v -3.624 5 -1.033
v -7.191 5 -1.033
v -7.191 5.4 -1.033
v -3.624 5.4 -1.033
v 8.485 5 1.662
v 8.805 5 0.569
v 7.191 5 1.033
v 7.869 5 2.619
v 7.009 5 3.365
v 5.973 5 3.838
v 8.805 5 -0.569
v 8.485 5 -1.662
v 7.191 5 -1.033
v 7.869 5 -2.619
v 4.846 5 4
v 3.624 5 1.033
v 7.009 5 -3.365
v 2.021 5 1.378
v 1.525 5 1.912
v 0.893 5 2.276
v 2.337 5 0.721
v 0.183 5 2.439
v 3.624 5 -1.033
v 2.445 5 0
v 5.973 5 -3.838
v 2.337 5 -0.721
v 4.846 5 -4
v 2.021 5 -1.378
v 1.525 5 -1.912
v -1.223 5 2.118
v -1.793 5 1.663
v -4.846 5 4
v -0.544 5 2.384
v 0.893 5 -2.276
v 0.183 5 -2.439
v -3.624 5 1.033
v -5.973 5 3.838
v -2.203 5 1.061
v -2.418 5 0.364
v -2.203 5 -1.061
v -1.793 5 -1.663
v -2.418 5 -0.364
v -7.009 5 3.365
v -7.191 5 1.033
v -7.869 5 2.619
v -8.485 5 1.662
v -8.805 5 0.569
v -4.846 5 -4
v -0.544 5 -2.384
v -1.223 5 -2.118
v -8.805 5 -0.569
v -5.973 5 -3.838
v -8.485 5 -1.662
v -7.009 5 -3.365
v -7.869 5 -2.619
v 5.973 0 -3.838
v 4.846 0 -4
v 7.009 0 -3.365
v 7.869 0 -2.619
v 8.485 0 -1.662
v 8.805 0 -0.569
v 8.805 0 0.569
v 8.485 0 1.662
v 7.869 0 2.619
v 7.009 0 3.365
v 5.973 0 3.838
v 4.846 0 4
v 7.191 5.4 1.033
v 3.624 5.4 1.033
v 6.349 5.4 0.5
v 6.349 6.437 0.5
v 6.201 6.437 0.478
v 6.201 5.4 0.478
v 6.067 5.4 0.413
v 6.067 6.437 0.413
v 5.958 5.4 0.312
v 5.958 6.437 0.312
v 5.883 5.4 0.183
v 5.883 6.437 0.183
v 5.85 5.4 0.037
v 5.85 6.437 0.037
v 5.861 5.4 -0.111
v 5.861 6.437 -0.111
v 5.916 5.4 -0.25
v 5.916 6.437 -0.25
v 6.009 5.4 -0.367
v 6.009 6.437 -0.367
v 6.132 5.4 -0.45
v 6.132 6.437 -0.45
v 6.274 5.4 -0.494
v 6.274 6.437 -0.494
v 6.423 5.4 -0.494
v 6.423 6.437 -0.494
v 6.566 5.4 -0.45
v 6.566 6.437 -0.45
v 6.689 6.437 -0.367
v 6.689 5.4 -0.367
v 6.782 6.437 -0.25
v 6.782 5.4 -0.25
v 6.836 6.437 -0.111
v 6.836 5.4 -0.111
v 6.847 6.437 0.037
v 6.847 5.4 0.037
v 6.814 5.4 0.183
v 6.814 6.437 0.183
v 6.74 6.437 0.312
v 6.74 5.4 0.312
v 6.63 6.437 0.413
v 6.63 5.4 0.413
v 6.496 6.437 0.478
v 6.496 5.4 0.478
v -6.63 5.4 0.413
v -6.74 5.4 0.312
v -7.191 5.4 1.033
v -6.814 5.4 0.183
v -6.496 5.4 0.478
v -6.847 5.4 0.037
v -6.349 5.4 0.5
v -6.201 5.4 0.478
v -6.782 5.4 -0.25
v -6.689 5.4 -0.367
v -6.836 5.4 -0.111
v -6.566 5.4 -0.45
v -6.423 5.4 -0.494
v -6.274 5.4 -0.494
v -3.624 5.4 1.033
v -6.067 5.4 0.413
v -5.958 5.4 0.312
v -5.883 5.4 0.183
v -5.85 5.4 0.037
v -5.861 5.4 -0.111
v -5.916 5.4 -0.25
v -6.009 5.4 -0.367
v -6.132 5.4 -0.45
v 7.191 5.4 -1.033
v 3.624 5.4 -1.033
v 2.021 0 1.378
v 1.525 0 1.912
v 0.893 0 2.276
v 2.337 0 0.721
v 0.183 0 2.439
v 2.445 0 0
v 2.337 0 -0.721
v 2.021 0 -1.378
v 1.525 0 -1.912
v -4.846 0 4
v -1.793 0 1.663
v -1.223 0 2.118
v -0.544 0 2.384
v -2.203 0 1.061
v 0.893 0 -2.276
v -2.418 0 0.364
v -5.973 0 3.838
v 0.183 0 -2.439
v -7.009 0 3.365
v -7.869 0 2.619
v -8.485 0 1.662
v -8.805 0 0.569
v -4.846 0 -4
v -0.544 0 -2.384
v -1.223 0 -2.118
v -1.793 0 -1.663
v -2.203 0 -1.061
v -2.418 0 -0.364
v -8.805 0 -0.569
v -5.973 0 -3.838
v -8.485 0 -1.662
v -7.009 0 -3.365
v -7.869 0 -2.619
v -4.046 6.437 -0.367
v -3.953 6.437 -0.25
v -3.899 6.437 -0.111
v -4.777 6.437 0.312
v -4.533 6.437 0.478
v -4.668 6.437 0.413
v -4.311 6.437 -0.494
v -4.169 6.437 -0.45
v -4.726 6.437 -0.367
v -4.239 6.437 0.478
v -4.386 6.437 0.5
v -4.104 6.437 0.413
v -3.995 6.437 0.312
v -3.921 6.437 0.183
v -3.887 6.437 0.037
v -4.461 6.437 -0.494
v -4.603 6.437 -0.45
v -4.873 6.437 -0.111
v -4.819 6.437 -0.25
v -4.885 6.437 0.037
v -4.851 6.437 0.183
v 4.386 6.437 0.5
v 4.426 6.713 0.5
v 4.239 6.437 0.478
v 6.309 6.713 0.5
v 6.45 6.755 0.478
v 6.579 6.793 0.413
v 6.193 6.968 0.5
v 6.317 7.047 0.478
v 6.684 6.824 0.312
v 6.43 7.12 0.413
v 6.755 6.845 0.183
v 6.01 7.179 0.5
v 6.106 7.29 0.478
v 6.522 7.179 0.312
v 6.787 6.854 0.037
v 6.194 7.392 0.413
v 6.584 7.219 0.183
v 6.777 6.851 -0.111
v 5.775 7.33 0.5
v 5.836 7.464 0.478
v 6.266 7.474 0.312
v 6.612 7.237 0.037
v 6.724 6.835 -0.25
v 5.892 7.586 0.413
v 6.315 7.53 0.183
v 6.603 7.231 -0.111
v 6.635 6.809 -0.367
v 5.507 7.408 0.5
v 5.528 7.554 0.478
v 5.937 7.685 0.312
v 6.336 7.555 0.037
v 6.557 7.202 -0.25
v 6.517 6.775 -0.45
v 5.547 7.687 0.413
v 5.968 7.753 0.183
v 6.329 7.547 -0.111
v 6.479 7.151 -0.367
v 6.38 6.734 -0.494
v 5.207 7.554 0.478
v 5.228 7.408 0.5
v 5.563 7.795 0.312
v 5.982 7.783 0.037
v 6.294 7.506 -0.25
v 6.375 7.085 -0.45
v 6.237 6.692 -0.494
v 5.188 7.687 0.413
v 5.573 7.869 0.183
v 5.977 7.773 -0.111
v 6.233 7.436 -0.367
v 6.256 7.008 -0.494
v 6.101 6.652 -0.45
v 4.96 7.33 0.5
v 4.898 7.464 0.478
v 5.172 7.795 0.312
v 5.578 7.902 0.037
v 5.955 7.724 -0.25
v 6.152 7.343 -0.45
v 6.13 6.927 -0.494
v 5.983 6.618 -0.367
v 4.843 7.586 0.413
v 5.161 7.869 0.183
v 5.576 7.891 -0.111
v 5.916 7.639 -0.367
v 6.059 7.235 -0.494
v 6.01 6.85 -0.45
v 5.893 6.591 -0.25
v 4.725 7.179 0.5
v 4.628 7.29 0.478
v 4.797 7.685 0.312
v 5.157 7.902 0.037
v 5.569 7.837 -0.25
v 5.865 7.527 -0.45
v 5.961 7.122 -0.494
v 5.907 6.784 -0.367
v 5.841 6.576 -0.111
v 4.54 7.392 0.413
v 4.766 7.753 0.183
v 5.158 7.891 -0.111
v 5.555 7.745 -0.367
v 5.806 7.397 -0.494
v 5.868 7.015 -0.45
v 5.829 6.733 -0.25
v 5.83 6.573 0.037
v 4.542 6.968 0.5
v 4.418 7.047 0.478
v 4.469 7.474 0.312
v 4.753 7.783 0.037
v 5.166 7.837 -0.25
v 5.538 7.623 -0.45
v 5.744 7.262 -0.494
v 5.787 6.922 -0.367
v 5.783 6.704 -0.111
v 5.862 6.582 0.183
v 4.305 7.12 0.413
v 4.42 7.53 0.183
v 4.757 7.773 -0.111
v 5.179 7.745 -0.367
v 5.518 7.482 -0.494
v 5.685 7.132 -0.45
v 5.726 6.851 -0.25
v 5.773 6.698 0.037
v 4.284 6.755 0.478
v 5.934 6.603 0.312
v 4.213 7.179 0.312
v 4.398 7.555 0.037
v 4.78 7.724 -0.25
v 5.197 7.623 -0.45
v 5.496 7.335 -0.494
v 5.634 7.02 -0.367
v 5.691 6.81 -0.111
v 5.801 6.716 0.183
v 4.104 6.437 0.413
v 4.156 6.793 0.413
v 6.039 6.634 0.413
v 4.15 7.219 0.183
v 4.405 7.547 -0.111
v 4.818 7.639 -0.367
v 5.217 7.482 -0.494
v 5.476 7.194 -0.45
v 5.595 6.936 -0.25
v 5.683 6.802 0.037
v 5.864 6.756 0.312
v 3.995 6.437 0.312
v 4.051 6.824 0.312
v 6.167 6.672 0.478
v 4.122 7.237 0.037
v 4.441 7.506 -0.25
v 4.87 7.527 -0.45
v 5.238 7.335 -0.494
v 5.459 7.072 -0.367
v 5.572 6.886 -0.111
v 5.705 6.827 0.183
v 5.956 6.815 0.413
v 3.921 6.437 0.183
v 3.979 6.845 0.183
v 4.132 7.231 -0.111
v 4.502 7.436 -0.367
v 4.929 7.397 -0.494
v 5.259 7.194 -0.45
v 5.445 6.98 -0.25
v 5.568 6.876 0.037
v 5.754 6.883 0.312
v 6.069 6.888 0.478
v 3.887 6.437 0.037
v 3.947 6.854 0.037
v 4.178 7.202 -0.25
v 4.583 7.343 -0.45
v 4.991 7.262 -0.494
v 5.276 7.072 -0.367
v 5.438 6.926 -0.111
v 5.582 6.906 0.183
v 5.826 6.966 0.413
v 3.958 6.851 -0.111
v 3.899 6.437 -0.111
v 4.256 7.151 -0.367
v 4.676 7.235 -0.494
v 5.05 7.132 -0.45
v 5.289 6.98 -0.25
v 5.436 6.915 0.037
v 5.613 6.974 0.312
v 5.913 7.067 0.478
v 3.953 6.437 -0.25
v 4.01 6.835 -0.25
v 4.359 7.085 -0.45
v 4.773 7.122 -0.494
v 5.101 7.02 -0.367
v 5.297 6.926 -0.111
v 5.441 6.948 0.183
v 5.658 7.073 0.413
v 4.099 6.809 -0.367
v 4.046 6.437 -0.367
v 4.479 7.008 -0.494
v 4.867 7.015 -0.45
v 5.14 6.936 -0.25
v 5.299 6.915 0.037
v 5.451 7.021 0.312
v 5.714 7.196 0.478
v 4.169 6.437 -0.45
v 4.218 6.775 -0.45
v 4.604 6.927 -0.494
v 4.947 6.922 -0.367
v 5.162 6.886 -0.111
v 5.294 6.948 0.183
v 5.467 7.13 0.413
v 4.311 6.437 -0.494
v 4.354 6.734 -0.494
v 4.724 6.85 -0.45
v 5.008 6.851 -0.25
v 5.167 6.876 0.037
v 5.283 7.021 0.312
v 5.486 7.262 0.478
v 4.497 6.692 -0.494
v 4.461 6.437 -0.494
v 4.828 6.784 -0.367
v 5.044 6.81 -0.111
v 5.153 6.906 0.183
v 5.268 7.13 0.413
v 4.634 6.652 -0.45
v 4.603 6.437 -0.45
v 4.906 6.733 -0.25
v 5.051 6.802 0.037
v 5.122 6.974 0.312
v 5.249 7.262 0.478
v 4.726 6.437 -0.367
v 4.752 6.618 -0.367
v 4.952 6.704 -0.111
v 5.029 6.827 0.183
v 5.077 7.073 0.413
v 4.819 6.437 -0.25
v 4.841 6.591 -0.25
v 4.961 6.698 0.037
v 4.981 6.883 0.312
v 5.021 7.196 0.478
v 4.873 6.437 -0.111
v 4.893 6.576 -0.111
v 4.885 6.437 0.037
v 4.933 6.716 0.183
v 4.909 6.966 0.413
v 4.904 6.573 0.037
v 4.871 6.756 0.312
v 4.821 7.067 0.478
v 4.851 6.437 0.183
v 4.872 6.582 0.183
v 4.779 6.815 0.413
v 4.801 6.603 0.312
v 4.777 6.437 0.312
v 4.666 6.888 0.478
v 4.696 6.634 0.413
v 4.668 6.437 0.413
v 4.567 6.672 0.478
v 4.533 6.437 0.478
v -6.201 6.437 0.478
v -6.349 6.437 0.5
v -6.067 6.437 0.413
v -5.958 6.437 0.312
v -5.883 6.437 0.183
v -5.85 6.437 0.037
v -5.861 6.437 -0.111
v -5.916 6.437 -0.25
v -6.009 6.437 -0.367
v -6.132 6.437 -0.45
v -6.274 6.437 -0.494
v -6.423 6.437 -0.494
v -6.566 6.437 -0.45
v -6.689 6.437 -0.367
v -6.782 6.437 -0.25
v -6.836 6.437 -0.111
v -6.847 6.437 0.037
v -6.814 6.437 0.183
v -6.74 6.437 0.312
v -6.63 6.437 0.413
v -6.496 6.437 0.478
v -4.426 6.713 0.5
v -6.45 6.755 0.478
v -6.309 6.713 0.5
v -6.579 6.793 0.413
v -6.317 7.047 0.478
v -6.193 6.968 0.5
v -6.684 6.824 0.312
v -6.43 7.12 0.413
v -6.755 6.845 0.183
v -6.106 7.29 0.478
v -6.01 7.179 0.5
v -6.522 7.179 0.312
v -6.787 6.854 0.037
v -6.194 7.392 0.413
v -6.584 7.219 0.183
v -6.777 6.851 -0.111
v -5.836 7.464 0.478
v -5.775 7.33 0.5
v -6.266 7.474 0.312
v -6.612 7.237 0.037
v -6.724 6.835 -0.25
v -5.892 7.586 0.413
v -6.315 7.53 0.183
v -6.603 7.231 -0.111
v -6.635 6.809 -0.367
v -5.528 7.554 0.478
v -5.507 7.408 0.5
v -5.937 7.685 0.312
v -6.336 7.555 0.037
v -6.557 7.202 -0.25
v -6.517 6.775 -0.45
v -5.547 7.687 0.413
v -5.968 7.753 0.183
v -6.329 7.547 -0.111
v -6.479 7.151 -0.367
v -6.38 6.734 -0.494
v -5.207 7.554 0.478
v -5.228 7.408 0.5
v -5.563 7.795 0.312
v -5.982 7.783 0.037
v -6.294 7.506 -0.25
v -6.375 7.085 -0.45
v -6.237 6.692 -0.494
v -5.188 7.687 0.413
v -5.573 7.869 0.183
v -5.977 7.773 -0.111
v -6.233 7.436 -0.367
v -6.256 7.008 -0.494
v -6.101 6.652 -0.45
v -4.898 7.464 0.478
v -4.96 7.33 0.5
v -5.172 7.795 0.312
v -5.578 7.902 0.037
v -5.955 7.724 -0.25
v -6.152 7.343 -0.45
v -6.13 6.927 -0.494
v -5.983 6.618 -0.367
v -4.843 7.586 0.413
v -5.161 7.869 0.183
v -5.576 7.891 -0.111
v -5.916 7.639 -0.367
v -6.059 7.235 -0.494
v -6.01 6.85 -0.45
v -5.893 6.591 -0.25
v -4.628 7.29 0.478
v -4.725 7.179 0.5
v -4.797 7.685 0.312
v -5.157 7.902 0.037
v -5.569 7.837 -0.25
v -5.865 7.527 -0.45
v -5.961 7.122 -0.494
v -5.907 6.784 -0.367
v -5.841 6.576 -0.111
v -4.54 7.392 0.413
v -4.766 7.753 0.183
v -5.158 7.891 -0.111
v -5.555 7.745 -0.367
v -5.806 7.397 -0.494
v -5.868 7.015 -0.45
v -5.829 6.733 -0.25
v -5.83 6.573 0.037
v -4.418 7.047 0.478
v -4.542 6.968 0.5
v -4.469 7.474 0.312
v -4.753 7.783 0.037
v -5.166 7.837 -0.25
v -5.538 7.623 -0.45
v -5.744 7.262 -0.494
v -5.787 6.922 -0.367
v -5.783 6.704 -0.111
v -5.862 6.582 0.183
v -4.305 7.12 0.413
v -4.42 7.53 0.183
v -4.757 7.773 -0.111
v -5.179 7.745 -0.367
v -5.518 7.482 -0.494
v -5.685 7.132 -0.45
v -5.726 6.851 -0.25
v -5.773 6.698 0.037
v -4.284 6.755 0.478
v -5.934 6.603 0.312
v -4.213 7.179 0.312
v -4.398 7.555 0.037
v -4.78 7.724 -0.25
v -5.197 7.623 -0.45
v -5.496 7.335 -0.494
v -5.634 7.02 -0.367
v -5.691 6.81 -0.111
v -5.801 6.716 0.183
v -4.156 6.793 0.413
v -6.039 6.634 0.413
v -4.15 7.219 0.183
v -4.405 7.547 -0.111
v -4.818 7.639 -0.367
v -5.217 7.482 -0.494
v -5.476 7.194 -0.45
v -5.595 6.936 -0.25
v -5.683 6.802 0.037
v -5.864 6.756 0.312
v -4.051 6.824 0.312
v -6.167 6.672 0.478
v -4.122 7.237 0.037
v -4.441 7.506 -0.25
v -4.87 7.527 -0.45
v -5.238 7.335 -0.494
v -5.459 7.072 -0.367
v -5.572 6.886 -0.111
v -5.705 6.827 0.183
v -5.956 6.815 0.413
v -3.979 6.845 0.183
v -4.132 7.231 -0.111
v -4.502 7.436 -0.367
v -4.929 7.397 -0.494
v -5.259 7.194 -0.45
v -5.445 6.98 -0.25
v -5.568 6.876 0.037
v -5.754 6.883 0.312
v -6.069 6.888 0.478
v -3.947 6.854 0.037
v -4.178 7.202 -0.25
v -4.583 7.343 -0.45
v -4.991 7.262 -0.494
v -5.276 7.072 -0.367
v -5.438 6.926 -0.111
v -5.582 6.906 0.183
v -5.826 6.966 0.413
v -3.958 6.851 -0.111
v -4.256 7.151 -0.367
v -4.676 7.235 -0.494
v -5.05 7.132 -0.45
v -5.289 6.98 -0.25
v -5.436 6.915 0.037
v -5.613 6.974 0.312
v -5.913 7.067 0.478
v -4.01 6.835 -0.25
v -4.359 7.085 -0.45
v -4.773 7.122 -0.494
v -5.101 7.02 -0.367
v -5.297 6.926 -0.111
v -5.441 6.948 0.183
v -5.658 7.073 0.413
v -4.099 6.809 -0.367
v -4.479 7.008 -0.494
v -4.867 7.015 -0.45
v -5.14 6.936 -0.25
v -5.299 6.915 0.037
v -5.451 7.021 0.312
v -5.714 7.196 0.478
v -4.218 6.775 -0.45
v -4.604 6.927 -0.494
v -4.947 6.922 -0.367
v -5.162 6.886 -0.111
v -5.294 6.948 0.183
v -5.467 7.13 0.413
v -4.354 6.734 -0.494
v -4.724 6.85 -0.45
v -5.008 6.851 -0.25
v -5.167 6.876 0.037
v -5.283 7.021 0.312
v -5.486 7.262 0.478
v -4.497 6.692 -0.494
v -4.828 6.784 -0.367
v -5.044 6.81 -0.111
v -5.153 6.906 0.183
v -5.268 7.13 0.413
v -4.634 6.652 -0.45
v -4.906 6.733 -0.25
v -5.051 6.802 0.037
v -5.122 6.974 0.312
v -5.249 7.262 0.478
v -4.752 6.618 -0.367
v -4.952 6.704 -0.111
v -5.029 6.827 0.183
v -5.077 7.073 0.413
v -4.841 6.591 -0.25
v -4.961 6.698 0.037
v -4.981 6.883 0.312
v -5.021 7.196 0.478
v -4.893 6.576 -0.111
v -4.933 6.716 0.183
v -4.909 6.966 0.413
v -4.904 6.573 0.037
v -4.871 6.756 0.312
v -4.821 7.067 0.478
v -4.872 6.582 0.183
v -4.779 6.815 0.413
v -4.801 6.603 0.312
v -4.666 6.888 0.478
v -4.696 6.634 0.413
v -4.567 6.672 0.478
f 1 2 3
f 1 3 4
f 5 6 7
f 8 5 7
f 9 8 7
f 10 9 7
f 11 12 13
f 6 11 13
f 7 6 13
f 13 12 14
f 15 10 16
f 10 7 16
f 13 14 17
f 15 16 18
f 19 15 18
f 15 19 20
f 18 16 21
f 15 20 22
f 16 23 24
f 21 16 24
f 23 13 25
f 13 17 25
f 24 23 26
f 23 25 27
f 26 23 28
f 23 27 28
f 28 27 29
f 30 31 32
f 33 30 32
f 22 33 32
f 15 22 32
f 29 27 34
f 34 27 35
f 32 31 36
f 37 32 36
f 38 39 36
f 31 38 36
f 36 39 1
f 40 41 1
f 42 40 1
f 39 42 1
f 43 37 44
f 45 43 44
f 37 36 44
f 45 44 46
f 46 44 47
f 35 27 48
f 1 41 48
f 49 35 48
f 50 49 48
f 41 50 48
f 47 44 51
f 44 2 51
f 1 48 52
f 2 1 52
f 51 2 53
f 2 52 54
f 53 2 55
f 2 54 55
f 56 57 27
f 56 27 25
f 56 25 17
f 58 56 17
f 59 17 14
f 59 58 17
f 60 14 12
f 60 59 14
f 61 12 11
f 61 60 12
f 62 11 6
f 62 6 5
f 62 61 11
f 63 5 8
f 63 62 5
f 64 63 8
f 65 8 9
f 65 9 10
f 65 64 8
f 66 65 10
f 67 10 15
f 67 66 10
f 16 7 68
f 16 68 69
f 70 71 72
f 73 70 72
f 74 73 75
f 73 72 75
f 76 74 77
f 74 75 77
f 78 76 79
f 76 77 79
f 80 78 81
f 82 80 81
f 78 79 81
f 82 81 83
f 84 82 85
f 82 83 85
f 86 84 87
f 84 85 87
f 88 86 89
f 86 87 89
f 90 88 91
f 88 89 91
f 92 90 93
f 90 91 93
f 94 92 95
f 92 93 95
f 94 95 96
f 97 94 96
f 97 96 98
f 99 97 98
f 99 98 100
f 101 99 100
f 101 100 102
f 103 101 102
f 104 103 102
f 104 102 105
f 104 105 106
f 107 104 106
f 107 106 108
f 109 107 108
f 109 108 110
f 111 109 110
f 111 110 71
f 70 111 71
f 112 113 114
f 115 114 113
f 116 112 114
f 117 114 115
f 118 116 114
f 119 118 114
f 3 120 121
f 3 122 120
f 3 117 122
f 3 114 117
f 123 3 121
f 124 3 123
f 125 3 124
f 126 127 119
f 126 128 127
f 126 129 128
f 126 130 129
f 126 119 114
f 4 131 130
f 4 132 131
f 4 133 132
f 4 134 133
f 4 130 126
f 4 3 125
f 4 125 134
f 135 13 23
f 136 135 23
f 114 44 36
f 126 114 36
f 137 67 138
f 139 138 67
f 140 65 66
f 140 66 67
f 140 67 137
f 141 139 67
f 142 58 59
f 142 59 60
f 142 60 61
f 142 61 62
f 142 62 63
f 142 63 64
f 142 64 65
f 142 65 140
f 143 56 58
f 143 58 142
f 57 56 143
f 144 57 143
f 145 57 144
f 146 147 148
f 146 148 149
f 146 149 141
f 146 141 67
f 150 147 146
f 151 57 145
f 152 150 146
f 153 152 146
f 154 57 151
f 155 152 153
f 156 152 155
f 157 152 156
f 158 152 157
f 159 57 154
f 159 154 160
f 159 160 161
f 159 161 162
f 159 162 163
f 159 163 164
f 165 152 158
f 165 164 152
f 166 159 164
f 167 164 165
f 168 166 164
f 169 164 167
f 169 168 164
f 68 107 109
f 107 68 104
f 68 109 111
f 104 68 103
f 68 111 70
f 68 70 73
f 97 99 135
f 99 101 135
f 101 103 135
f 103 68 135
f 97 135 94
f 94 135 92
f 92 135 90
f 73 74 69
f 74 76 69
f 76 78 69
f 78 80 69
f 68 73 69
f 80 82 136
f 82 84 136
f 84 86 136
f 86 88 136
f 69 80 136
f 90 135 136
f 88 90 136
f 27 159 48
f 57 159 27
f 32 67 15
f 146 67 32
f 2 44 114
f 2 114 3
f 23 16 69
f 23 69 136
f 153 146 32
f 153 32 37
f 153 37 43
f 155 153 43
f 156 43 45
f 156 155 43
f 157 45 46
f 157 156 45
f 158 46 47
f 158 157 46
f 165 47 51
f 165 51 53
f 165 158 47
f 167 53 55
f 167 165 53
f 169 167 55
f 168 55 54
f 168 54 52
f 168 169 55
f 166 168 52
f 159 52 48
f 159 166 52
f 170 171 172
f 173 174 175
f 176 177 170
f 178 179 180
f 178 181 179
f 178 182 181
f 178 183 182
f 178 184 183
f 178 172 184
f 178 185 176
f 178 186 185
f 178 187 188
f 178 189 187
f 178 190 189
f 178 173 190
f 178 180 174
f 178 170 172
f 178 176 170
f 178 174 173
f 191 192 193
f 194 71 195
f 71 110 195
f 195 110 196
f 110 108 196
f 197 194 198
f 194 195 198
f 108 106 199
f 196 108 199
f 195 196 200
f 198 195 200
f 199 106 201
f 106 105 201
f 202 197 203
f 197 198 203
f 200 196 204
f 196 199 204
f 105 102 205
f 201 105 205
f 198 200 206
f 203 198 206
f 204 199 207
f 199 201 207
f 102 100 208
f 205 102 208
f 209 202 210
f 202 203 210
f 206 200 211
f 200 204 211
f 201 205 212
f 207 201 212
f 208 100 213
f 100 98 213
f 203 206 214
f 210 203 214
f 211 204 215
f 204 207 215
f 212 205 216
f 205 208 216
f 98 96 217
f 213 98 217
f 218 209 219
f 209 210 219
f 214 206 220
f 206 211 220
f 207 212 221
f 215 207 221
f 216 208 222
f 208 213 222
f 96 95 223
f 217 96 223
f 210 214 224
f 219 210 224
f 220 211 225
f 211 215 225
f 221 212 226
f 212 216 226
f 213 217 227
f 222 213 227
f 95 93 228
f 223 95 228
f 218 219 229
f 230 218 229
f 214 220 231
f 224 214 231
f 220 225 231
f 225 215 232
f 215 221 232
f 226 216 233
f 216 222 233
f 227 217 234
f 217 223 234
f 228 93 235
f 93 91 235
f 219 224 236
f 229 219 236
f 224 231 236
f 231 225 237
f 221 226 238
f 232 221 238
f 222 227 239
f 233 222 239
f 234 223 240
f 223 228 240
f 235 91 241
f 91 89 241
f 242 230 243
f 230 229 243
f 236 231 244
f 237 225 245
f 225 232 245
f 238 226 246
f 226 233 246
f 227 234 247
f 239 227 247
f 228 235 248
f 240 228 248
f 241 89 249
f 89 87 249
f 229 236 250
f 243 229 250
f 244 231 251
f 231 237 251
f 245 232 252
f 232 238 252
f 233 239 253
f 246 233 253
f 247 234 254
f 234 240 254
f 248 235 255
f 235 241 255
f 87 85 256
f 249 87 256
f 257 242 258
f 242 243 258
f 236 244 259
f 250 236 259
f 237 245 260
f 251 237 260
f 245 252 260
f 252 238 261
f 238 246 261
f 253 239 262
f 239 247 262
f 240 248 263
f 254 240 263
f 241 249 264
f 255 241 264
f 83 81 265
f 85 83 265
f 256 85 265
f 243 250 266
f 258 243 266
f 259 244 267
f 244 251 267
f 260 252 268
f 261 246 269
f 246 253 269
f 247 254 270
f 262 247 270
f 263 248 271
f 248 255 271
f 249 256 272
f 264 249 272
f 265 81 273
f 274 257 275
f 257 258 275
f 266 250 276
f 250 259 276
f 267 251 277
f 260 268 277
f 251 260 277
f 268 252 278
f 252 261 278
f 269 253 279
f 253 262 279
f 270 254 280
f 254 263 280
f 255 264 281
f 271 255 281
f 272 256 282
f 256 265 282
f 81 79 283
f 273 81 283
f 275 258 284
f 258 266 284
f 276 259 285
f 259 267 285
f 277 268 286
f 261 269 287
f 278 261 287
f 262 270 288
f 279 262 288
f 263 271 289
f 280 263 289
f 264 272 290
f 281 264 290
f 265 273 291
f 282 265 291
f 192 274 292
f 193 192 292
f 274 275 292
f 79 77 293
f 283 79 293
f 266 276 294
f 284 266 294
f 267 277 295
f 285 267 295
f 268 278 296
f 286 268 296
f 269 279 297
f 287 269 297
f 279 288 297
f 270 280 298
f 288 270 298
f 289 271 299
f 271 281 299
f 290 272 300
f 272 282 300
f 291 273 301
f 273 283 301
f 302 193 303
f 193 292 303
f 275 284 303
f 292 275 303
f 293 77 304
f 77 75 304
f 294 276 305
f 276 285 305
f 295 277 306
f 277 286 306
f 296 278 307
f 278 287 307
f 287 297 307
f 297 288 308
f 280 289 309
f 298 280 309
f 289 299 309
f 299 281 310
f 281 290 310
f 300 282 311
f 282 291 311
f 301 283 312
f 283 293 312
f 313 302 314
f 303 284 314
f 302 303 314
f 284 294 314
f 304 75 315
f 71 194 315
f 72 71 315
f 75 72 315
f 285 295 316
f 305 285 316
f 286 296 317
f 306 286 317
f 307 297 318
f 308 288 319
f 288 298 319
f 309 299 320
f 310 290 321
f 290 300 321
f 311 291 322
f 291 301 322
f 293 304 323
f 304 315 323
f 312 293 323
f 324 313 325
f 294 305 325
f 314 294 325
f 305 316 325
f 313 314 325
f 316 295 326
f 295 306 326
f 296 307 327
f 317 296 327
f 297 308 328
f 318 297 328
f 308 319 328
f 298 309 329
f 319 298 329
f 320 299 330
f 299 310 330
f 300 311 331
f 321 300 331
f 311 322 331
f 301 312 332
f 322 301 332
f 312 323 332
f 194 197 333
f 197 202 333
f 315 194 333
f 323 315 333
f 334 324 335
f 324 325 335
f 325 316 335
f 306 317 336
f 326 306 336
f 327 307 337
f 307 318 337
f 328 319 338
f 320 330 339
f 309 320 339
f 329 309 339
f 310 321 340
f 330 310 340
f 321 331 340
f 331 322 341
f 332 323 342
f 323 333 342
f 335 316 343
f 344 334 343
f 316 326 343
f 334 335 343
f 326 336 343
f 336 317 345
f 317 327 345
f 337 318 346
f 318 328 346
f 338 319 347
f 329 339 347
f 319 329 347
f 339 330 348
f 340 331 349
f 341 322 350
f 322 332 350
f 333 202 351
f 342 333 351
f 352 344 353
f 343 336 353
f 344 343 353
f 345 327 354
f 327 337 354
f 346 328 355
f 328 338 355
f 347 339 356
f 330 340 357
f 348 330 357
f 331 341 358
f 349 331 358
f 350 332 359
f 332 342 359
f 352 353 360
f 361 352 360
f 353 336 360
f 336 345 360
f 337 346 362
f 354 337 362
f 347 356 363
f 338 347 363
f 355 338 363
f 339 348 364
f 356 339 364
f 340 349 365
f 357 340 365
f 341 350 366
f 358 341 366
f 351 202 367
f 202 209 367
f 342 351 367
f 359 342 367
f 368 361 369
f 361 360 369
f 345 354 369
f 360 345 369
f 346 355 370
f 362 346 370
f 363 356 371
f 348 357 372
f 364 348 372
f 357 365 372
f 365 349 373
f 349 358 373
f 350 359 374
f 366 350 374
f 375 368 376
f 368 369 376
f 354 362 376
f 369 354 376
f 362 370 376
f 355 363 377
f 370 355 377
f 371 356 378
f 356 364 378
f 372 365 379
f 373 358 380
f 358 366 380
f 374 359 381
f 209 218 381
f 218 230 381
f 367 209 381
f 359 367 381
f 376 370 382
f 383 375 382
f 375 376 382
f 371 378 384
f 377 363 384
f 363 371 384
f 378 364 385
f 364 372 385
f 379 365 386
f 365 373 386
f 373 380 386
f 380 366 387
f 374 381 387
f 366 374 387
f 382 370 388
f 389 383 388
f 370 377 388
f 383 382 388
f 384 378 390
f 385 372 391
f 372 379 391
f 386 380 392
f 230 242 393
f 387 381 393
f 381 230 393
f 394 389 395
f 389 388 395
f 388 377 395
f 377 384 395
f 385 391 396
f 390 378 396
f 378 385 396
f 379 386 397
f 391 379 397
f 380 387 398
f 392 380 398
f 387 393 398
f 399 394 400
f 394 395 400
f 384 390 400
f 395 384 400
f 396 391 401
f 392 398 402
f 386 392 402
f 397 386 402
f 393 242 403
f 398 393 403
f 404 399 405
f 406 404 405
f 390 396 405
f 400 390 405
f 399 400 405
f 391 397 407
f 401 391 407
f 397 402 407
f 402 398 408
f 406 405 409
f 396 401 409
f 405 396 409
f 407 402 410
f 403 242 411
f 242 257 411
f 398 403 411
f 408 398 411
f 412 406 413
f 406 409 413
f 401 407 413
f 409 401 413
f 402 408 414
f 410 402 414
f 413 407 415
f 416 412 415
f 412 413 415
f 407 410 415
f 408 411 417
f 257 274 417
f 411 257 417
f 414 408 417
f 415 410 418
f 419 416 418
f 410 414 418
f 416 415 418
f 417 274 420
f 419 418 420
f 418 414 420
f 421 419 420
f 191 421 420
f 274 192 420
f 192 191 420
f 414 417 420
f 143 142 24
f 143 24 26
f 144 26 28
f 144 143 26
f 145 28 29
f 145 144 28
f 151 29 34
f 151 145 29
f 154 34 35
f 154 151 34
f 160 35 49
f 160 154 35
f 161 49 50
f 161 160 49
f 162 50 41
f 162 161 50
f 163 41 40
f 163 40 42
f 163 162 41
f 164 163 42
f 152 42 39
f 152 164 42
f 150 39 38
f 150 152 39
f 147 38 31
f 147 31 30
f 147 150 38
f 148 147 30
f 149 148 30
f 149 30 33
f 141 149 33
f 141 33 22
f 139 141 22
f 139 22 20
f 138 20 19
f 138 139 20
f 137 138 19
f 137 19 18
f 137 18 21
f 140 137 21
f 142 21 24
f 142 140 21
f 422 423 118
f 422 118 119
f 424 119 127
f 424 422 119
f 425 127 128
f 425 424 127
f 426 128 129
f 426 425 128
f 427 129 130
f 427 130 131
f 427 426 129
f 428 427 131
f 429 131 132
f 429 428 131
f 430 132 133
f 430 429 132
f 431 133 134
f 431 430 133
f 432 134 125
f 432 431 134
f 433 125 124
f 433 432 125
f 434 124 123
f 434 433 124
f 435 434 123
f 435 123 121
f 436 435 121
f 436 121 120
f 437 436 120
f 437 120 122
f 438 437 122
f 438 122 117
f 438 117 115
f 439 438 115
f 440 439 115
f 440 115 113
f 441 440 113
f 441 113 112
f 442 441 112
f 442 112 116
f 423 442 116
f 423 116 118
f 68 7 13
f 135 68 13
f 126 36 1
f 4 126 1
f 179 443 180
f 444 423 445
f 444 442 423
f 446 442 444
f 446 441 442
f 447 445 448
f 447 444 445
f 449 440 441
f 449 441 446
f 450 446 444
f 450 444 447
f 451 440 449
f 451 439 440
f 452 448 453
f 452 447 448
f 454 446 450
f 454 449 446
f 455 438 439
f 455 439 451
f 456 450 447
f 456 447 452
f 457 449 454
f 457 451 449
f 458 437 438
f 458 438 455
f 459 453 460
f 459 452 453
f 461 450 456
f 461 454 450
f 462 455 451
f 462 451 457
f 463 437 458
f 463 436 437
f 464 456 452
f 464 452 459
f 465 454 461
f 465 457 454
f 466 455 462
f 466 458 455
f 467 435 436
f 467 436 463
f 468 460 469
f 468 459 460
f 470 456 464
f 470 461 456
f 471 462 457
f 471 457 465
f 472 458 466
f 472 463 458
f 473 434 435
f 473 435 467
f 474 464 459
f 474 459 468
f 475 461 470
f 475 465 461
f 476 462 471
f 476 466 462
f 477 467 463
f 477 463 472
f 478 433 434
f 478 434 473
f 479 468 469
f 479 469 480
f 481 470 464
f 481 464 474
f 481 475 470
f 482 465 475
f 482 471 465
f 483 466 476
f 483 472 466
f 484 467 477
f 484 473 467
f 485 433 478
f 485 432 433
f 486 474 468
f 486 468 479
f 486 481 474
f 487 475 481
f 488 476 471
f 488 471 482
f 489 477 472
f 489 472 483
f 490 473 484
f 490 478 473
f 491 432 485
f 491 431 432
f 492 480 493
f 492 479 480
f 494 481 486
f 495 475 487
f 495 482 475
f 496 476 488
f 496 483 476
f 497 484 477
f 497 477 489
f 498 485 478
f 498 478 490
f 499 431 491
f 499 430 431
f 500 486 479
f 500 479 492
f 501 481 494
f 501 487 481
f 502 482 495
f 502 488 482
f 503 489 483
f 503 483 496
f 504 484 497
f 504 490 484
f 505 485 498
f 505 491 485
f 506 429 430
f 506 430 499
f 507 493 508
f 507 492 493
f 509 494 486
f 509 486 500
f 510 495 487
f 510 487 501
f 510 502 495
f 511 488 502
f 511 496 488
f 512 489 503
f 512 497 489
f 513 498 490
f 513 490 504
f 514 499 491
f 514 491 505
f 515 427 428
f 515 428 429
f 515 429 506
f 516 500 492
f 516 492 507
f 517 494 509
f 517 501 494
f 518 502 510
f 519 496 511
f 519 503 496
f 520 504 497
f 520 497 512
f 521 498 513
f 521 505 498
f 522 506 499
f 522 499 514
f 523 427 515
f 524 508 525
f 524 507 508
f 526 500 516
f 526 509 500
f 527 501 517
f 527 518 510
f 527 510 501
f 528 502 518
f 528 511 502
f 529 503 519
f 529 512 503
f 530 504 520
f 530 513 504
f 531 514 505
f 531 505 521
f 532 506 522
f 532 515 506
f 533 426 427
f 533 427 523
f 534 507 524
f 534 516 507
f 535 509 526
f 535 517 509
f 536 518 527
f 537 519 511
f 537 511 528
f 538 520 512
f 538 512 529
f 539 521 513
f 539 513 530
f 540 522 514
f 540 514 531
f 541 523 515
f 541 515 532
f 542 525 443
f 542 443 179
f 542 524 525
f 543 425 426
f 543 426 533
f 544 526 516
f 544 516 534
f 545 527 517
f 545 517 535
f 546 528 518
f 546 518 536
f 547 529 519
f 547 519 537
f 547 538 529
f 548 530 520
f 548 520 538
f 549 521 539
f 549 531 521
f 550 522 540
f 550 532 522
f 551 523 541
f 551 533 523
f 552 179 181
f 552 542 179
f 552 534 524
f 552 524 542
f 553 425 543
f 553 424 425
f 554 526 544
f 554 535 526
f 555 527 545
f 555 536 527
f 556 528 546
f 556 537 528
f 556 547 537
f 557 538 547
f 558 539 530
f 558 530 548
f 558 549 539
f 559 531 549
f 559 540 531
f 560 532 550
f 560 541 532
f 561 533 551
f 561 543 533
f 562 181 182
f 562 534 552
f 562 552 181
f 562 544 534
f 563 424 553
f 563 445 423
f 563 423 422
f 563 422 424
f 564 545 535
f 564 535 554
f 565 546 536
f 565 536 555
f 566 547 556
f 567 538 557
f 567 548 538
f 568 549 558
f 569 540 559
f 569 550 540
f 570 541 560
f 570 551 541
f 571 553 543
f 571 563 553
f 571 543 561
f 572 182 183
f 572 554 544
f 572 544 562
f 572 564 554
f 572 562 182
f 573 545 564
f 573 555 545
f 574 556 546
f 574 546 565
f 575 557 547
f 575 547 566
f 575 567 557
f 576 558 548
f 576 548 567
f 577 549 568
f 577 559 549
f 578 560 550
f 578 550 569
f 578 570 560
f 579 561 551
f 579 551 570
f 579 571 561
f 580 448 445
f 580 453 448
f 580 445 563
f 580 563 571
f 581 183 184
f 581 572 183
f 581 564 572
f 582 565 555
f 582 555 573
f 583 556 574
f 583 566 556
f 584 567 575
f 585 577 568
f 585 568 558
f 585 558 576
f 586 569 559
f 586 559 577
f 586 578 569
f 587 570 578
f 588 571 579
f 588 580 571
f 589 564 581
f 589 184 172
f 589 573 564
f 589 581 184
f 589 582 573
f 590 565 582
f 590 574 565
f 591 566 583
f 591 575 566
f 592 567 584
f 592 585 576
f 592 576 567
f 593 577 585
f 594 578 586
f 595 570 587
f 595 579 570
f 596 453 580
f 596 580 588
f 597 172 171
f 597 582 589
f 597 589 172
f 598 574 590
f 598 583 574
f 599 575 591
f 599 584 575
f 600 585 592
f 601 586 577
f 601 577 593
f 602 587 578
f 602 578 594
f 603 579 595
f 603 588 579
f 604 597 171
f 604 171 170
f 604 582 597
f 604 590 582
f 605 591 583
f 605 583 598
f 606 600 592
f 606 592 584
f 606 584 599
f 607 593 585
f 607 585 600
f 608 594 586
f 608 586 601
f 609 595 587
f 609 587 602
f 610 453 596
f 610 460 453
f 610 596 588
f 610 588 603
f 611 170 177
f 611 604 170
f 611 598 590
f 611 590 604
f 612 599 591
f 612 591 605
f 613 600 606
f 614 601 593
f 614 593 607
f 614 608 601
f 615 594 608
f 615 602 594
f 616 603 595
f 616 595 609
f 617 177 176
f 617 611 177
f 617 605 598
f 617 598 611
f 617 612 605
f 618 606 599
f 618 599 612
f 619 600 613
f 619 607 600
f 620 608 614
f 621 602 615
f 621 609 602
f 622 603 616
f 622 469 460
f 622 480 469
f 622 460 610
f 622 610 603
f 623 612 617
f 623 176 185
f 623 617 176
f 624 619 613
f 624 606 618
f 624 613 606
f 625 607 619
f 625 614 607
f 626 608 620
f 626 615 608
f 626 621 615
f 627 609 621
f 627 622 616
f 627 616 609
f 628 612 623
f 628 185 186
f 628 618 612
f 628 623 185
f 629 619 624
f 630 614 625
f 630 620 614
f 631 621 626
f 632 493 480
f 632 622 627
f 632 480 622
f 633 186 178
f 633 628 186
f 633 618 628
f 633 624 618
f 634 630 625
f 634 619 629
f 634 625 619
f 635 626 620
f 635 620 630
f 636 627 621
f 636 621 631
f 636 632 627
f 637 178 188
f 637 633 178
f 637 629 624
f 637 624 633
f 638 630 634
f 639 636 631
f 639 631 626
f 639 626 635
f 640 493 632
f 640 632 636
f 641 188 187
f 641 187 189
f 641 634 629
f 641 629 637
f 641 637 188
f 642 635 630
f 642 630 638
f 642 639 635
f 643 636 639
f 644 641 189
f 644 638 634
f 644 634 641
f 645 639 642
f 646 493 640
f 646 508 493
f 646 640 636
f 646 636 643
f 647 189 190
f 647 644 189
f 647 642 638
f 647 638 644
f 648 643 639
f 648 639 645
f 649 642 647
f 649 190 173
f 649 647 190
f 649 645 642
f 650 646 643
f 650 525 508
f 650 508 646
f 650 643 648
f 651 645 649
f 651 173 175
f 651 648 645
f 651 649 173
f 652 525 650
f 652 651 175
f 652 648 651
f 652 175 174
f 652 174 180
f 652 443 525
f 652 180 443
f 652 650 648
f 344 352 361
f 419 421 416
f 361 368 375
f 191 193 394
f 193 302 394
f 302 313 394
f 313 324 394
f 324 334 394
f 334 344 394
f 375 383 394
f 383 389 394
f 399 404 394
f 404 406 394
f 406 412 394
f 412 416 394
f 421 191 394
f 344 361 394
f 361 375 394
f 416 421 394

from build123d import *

# Parameters (mm, degrees)
SKETCH1_R           = 2.44543137
BOSS_EXTRUDE1_DEPTH = 5
SKETCH2_W           = 3.567027941
SKETCH2_H           = 2.066611426
BOSS_EXTRUDE2_DEPTH = 0.4
SWEEP2_PROFILE_R    = 0.5


with BuildPart() as part:
    # Sketch1 → Boss-Extrude1 (new body)
    with BuildSketch(Plane(origin=(0, 0, 0), x_dir=(1, 0, 0), z_dir=(0, 1, 0))):
        with BuildLine():
            Line((-4.846115072, 4), (4.846115072, 4))
            ThreePointArc((4.846115072, 4), (8.846115072, 0), (4.846115072, -4))
            Line((4.846115072, -4), (-4.846115072, -4))
            ThreePointArc((-4.846115072, -4), (-8.846115072, 0), (-4.846115072, 4))
        make_face()
        Circle(SKETCH1_R, mode=Mode.SUBTRACT)
    extrude(amount=BOSS_EXTRUDE1_DEPTH)

    # Sketch2 → Boss-Extrude2 (add)
    with BuildSketch(Plane(origin=(0, 5, 0), x_dir=(1, 0, 0), z_dir=(0, 1, 0))):
        with Locations((-5.407161402, 0)):
            Rectangle(SKETCH2_W, SKETCH2_H)
    boss_extrude2 = extrude(amount=BOSS_EXTRUDE2_DEPTH)

    # Sweep2: sweep along a path in Sketch3
    with BuildLine(Plane.XY) as sweep2_path:
        Line((-6.34863908, 5.4), (-6.34863908, 6.437017348))
        ThreePointArc((-6.34863908, 6.437017348), (-5.367322582, 7.418333845), (-4.386006084, 6.437017348))
    # Sweep2 profile (on start of the path) → Sweep2 (sweep)
    with BuildSketch(Plane(origin=(-6.34863908, 5.4, 0), x_dir=(0, 0, 1), z_dir=(0, 1, 0))):
        Circle(SWEEP2_PROFILE_R)
    sweep2 = sweep(path=sweep2_path.line)

    # Mirror1: Boss-Extrude2, Sweep2 across plane
    add(boss_extrude2.mirror(Plane(origin=(0, 0, 0), x_dir=(0, 0, 1), z_dir=(1, 0, 0))))
    add(sweep2.mirror(Plane(origin=(0, 0, 0), x_dir=(0, 0, 1), z_dir=(1, 0, 0))))


solid = part.part
